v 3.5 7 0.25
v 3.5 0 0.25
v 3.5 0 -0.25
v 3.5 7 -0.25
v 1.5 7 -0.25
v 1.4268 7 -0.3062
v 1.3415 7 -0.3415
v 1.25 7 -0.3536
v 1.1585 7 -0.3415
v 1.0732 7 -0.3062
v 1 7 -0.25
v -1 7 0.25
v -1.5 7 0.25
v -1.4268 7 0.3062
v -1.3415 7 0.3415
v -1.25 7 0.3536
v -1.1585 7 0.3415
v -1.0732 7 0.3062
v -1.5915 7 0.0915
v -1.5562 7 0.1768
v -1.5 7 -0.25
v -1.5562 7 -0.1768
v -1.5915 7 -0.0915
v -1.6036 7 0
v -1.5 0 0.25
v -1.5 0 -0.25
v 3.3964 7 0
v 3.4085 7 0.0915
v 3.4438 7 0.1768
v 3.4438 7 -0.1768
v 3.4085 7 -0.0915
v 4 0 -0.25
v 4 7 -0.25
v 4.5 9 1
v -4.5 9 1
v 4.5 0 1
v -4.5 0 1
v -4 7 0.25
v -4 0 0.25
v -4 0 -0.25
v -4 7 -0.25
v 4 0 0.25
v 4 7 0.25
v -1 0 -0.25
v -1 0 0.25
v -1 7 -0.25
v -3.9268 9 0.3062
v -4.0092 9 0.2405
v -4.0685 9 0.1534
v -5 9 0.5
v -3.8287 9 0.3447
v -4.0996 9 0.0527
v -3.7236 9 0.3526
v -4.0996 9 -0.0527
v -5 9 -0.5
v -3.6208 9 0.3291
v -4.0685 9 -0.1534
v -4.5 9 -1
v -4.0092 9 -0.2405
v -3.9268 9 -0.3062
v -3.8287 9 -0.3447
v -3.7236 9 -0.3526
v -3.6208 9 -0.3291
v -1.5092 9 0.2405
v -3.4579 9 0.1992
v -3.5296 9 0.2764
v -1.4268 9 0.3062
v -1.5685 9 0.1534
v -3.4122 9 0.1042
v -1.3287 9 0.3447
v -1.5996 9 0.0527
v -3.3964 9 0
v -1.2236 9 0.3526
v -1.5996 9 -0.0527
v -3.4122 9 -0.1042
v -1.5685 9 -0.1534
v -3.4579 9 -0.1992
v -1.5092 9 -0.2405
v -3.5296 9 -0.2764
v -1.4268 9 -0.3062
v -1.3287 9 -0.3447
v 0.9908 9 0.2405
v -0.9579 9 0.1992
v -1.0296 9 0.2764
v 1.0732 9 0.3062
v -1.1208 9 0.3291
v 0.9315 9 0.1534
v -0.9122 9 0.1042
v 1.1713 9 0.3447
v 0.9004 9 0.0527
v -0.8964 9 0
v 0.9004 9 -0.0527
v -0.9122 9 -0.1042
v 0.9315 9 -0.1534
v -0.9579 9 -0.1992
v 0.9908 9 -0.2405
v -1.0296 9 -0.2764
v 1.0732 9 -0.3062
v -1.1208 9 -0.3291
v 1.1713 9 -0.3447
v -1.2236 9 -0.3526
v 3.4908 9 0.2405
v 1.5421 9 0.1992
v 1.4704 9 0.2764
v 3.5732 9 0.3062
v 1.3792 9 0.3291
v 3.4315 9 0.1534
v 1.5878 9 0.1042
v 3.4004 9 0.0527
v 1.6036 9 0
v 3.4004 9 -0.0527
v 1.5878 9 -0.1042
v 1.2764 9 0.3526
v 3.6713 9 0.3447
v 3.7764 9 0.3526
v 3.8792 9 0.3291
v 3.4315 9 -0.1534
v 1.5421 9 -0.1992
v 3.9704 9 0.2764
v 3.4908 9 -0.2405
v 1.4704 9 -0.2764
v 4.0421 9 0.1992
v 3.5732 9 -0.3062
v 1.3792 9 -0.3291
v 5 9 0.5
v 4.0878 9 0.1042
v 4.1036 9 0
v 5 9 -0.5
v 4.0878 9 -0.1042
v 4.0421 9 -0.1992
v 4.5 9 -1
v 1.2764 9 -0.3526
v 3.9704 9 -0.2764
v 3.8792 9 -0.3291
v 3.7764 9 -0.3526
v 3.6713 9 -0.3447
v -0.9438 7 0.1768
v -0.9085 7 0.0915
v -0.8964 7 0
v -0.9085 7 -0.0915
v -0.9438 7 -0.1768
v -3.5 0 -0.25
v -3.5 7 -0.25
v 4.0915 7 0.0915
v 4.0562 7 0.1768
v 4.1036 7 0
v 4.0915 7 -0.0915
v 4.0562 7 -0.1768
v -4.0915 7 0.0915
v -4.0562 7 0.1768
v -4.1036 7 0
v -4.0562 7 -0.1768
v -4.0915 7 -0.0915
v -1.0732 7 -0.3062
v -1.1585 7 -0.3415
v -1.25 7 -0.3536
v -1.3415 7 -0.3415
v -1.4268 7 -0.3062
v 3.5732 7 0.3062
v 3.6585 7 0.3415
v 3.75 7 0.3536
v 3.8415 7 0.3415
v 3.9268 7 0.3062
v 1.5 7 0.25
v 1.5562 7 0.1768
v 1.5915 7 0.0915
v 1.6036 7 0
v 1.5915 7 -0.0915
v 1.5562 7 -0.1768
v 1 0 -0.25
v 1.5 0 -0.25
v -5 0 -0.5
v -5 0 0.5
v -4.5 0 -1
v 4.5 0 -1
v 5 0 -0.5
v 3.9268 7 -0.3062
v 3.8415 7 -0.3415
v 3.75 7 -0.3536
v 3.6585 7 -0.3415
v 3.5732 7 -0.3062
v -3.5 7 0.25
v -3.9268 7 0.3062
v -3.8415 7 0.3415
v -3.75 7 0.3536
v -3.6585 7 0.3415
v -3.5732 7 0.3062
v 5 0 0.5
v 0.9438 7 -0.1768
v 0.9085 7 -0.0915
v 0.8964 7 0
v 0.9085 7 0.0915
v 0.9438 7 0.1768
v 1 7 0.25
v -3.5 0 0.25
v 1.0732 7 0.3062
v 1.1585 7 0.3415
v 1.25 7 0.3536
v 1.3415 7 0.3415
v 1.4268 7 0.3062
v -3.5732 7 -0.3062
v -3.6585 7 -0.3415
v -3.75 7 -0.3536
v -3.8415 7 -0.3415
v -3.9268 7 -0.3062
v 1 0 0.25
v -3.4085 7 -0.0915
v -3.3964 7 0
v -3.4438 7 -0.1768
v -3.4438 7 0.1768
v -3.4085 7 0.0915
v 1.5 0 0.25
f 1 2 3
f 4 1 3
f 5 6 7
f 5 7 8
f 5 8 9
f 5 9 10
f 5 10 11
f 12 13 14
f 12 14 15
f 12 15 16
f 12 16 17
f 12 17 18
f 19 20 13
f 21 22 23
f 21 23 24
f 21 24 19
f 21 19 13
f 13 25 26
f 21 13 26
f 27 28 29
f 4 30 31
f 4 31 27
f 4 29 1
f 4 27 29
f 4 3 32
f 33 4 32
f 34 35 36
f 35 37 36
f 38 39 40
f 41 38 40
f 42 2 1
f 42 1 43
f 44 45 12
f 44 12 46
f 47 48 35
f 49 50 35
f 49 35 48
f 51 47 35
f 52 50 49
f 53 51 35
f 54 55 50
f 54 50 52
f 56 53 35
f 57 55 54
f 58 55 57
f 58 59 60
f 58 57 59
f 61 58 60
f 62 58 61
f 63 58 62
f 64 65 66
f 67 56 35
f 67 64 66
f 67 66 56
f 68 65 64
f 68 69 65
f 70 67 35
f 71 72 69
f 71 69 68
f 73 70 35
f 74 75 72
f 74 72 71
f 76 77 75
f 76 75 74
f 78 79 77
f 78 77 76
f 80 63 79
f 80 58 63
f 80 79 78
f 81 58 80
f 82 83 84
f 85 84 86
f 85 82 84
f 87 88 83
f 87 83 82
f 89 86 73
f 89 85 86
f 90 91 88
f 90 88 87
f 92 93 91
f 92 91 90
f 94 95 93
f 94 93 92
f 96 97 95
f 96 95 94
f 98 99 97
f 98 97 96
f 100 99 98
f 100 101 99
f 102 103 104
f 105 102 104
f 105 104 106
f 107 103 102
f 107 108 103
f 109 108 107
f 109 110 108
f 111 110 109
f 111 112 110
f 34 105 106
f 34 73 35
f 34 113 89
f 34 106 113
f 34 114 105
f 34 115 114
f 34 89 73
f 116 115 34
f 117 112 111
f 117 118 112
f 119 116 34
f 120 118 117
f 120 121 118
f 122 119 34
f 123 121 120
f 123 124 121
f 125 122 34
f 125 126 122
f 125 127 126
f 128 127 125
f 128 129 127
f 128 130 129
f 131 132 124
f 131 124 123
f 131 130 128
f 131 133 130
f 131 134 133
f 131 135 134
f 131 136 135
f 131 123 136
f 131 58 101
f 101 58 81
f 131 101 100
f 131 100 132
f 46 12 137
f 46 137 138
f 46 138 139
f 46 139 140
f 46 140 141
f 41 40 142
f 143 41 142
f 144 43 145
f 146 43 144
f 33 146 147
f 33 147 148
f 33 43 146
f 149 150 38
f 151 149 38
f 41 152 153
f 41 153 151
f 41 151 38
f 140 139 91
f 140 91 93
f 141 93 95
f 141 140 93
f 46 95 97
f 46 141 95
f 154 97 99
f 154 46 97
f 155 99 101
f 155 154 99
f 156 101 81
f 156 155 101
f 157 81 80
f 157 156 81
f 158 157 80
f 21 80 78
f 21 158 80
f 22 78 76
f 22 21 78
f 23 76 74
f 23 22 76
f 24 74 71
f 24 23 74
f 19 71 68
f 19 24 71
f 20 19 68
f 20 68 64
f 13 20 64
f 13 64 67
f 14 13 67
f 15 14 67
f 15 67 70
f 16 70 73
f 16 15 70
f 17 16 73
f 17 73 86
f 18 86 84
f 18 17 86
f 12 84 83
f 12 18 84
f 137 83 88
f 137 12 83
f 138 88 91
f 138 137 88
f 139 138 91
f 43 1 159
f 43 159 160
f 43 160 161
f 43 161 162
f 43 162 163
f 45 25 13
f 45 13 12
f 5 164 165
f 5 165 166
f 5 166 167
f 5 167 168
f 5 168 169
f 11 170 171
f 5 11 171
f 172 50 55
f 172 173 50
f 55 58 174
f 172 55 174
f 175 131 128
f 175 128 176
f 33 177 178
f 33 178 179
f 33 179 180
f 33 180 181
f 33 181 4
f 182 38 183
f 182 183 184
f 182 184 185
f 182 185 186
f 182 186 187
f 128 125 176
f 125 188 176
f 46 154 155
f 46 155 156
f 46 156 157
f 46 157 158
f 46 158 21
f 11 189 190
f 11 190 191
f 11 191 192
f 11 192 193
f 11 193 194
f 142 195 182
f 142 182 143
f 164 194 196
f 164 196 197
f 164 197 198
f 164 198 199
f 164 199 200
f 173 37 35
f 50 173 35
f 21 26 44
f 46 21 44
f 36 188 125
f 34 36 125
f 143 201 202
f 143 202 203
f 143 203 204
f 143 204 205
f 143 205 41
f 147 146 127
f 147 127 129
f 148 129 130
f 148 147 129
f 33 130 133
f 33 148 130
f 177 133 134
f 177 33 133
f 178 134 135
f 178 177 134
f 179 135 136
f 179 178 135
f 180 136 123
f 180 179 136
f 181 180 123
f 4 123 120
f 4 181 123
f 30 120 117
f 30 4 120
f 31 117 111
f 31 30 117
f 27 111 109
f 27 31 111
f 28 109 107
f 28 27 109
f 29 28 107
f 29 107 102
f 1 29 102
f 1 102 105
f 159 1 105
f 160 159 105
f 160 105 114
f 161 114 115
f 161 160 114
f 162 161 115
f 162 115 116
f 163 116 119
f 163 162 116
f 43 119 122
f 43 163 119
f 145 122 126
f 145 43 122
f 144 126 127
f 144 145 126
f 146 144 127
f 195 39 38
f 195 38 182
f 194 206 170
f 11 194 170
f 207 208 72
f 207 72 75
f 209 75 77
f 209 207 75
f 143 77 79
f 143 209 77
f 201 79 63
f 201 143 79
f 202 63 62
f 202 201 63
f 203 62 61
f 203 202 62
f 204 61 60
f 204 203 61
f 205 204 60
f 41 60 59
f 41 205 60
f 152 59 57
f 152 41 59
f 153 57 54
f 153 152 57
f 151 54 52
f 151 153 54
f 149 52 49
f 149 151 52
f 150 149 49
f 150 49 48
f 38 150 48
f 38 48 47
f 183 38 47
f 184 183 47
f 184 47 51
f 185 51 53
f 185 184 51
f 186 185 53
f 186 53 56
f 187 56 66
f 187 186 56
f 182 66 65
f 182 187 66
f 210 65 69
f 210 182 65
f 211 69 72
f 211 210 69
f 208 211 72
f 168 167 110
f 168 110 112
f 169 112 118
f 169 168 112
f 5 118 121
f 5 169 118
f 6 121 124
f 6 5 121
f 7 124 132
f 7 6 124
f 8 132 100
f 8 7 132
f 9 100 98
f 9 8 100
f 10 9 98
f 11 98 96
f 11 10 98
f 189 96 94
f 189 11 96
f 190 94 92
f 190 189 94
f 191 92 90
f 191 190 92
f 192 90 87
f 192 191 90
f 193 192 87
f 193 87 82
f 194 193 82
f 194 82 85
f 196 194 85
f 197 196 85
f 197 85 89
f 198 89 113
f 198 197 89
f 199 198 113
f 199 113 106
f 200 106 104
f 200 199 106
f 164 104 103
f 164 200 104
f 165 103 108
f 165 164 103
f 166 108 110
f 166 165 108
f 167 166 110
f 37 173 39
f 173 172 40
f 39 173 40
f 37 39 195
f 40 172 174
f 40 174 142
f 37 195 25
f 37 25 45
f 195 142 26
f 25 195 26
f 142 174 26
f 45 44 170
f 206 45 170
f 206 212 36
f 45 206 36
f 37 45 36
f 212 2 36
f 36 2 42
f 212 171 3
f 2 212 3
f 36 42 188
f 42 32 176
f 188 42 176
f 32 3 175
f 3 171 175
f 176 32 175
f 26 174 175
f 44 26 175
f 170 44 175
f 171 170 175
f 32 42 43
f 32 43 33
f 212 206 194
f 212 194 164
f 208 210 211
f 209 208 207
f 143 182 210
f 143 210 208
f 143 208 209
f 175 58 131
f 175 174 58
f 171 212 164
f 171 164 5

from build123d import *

# Parameters (mm, degrees)
SKETCH_1_W      = 10
SKETCH_1_H      = 2
SKETCH_1_W_2    = 0.5
SKETCH_1_H_2    = 0.5
EXTRUDE_1_DEPTH = 7
SKETCH_2_W      = 10
SKETCH_2_H      = 2
SKETCH_2_R      = 0.353553391
EXTRUDE_2_DEPTH = 2
CHAMFER_1_SIZE  = 0.5


with BuildPart() as part:
    # Эскиз1 → Бобышка-Вытянуть1 (new body)
    with BuildSketch(Plane(origin=(0, 0, 0), x_dir=(1, 0, 0), z_dir=(0, 1, 0))):
        Rectangle(SKETCH_1_W, SKETCH_1_H)
        with Locations((-3.75, 0)):
            Rectangle(SKETCH_1_W_2, SKETCH_1_H_2, mode=Mode.SUBTRACT)
        with Locations((3.75, 0)):
            Rectangle(SKETCH_1_W_2, SKETCH_1_H_2, mode=Mode.SUBTRACT)
        with Locations((-1.25, 0)):
            Rectangle(SKETCH_1_W_2, SKETCH_1_H_2, mode=Mode.SUBTRACT)
        with Locations((1.25, 0)):
            Rectangle(SKETCH_1_W_2, SKETCH_1_H_2, mode=Mode.SUBTRACT)
    extrude(amount=EXTRUDE_1_DEPTH)

    # Эскиз2 → Бобышка-Вытянуть2 (add)
    with BuildSketch(Plane(origin=(0, 7, 0), x_dir=(1, 0, 0), z_dir=(0, 1, 0))):
        Rectangle(SKETCH_2_W, SKETCH_2_H)
        with Locations((-3.75, 0)):
            Circle(SKETCH_2_R, mode=Mode.SUBTRACT)
        with Locations((-1.25, 0)):
            Circle(SKETCH_2_R, mode=Mode.SUBTRACT)
        with Locations((1.25, 0)):
            Circle(SKETCH_2_R, mode=Mode.SUBTRACT)
        with Locations((3.75, 0)):
            Circle(SKETCH_2_R, mode=Mode.SUBTRACT)
    extrude(amount=EXTRUDE_2_DEPTH)

    # Фаска1
    chamfer_1_edges = [part.edges().sort_by_distance(p)[0] for p in [
        (5, 4.5, 1),
        (-5, 4.5, 1),
        (-5, 4.5, -1),
        (5, 4.5, -1),
    ]]
    chamfer(chamfer_1_edges, length=CHAMFER_1_SIZE)


solid = part.part
